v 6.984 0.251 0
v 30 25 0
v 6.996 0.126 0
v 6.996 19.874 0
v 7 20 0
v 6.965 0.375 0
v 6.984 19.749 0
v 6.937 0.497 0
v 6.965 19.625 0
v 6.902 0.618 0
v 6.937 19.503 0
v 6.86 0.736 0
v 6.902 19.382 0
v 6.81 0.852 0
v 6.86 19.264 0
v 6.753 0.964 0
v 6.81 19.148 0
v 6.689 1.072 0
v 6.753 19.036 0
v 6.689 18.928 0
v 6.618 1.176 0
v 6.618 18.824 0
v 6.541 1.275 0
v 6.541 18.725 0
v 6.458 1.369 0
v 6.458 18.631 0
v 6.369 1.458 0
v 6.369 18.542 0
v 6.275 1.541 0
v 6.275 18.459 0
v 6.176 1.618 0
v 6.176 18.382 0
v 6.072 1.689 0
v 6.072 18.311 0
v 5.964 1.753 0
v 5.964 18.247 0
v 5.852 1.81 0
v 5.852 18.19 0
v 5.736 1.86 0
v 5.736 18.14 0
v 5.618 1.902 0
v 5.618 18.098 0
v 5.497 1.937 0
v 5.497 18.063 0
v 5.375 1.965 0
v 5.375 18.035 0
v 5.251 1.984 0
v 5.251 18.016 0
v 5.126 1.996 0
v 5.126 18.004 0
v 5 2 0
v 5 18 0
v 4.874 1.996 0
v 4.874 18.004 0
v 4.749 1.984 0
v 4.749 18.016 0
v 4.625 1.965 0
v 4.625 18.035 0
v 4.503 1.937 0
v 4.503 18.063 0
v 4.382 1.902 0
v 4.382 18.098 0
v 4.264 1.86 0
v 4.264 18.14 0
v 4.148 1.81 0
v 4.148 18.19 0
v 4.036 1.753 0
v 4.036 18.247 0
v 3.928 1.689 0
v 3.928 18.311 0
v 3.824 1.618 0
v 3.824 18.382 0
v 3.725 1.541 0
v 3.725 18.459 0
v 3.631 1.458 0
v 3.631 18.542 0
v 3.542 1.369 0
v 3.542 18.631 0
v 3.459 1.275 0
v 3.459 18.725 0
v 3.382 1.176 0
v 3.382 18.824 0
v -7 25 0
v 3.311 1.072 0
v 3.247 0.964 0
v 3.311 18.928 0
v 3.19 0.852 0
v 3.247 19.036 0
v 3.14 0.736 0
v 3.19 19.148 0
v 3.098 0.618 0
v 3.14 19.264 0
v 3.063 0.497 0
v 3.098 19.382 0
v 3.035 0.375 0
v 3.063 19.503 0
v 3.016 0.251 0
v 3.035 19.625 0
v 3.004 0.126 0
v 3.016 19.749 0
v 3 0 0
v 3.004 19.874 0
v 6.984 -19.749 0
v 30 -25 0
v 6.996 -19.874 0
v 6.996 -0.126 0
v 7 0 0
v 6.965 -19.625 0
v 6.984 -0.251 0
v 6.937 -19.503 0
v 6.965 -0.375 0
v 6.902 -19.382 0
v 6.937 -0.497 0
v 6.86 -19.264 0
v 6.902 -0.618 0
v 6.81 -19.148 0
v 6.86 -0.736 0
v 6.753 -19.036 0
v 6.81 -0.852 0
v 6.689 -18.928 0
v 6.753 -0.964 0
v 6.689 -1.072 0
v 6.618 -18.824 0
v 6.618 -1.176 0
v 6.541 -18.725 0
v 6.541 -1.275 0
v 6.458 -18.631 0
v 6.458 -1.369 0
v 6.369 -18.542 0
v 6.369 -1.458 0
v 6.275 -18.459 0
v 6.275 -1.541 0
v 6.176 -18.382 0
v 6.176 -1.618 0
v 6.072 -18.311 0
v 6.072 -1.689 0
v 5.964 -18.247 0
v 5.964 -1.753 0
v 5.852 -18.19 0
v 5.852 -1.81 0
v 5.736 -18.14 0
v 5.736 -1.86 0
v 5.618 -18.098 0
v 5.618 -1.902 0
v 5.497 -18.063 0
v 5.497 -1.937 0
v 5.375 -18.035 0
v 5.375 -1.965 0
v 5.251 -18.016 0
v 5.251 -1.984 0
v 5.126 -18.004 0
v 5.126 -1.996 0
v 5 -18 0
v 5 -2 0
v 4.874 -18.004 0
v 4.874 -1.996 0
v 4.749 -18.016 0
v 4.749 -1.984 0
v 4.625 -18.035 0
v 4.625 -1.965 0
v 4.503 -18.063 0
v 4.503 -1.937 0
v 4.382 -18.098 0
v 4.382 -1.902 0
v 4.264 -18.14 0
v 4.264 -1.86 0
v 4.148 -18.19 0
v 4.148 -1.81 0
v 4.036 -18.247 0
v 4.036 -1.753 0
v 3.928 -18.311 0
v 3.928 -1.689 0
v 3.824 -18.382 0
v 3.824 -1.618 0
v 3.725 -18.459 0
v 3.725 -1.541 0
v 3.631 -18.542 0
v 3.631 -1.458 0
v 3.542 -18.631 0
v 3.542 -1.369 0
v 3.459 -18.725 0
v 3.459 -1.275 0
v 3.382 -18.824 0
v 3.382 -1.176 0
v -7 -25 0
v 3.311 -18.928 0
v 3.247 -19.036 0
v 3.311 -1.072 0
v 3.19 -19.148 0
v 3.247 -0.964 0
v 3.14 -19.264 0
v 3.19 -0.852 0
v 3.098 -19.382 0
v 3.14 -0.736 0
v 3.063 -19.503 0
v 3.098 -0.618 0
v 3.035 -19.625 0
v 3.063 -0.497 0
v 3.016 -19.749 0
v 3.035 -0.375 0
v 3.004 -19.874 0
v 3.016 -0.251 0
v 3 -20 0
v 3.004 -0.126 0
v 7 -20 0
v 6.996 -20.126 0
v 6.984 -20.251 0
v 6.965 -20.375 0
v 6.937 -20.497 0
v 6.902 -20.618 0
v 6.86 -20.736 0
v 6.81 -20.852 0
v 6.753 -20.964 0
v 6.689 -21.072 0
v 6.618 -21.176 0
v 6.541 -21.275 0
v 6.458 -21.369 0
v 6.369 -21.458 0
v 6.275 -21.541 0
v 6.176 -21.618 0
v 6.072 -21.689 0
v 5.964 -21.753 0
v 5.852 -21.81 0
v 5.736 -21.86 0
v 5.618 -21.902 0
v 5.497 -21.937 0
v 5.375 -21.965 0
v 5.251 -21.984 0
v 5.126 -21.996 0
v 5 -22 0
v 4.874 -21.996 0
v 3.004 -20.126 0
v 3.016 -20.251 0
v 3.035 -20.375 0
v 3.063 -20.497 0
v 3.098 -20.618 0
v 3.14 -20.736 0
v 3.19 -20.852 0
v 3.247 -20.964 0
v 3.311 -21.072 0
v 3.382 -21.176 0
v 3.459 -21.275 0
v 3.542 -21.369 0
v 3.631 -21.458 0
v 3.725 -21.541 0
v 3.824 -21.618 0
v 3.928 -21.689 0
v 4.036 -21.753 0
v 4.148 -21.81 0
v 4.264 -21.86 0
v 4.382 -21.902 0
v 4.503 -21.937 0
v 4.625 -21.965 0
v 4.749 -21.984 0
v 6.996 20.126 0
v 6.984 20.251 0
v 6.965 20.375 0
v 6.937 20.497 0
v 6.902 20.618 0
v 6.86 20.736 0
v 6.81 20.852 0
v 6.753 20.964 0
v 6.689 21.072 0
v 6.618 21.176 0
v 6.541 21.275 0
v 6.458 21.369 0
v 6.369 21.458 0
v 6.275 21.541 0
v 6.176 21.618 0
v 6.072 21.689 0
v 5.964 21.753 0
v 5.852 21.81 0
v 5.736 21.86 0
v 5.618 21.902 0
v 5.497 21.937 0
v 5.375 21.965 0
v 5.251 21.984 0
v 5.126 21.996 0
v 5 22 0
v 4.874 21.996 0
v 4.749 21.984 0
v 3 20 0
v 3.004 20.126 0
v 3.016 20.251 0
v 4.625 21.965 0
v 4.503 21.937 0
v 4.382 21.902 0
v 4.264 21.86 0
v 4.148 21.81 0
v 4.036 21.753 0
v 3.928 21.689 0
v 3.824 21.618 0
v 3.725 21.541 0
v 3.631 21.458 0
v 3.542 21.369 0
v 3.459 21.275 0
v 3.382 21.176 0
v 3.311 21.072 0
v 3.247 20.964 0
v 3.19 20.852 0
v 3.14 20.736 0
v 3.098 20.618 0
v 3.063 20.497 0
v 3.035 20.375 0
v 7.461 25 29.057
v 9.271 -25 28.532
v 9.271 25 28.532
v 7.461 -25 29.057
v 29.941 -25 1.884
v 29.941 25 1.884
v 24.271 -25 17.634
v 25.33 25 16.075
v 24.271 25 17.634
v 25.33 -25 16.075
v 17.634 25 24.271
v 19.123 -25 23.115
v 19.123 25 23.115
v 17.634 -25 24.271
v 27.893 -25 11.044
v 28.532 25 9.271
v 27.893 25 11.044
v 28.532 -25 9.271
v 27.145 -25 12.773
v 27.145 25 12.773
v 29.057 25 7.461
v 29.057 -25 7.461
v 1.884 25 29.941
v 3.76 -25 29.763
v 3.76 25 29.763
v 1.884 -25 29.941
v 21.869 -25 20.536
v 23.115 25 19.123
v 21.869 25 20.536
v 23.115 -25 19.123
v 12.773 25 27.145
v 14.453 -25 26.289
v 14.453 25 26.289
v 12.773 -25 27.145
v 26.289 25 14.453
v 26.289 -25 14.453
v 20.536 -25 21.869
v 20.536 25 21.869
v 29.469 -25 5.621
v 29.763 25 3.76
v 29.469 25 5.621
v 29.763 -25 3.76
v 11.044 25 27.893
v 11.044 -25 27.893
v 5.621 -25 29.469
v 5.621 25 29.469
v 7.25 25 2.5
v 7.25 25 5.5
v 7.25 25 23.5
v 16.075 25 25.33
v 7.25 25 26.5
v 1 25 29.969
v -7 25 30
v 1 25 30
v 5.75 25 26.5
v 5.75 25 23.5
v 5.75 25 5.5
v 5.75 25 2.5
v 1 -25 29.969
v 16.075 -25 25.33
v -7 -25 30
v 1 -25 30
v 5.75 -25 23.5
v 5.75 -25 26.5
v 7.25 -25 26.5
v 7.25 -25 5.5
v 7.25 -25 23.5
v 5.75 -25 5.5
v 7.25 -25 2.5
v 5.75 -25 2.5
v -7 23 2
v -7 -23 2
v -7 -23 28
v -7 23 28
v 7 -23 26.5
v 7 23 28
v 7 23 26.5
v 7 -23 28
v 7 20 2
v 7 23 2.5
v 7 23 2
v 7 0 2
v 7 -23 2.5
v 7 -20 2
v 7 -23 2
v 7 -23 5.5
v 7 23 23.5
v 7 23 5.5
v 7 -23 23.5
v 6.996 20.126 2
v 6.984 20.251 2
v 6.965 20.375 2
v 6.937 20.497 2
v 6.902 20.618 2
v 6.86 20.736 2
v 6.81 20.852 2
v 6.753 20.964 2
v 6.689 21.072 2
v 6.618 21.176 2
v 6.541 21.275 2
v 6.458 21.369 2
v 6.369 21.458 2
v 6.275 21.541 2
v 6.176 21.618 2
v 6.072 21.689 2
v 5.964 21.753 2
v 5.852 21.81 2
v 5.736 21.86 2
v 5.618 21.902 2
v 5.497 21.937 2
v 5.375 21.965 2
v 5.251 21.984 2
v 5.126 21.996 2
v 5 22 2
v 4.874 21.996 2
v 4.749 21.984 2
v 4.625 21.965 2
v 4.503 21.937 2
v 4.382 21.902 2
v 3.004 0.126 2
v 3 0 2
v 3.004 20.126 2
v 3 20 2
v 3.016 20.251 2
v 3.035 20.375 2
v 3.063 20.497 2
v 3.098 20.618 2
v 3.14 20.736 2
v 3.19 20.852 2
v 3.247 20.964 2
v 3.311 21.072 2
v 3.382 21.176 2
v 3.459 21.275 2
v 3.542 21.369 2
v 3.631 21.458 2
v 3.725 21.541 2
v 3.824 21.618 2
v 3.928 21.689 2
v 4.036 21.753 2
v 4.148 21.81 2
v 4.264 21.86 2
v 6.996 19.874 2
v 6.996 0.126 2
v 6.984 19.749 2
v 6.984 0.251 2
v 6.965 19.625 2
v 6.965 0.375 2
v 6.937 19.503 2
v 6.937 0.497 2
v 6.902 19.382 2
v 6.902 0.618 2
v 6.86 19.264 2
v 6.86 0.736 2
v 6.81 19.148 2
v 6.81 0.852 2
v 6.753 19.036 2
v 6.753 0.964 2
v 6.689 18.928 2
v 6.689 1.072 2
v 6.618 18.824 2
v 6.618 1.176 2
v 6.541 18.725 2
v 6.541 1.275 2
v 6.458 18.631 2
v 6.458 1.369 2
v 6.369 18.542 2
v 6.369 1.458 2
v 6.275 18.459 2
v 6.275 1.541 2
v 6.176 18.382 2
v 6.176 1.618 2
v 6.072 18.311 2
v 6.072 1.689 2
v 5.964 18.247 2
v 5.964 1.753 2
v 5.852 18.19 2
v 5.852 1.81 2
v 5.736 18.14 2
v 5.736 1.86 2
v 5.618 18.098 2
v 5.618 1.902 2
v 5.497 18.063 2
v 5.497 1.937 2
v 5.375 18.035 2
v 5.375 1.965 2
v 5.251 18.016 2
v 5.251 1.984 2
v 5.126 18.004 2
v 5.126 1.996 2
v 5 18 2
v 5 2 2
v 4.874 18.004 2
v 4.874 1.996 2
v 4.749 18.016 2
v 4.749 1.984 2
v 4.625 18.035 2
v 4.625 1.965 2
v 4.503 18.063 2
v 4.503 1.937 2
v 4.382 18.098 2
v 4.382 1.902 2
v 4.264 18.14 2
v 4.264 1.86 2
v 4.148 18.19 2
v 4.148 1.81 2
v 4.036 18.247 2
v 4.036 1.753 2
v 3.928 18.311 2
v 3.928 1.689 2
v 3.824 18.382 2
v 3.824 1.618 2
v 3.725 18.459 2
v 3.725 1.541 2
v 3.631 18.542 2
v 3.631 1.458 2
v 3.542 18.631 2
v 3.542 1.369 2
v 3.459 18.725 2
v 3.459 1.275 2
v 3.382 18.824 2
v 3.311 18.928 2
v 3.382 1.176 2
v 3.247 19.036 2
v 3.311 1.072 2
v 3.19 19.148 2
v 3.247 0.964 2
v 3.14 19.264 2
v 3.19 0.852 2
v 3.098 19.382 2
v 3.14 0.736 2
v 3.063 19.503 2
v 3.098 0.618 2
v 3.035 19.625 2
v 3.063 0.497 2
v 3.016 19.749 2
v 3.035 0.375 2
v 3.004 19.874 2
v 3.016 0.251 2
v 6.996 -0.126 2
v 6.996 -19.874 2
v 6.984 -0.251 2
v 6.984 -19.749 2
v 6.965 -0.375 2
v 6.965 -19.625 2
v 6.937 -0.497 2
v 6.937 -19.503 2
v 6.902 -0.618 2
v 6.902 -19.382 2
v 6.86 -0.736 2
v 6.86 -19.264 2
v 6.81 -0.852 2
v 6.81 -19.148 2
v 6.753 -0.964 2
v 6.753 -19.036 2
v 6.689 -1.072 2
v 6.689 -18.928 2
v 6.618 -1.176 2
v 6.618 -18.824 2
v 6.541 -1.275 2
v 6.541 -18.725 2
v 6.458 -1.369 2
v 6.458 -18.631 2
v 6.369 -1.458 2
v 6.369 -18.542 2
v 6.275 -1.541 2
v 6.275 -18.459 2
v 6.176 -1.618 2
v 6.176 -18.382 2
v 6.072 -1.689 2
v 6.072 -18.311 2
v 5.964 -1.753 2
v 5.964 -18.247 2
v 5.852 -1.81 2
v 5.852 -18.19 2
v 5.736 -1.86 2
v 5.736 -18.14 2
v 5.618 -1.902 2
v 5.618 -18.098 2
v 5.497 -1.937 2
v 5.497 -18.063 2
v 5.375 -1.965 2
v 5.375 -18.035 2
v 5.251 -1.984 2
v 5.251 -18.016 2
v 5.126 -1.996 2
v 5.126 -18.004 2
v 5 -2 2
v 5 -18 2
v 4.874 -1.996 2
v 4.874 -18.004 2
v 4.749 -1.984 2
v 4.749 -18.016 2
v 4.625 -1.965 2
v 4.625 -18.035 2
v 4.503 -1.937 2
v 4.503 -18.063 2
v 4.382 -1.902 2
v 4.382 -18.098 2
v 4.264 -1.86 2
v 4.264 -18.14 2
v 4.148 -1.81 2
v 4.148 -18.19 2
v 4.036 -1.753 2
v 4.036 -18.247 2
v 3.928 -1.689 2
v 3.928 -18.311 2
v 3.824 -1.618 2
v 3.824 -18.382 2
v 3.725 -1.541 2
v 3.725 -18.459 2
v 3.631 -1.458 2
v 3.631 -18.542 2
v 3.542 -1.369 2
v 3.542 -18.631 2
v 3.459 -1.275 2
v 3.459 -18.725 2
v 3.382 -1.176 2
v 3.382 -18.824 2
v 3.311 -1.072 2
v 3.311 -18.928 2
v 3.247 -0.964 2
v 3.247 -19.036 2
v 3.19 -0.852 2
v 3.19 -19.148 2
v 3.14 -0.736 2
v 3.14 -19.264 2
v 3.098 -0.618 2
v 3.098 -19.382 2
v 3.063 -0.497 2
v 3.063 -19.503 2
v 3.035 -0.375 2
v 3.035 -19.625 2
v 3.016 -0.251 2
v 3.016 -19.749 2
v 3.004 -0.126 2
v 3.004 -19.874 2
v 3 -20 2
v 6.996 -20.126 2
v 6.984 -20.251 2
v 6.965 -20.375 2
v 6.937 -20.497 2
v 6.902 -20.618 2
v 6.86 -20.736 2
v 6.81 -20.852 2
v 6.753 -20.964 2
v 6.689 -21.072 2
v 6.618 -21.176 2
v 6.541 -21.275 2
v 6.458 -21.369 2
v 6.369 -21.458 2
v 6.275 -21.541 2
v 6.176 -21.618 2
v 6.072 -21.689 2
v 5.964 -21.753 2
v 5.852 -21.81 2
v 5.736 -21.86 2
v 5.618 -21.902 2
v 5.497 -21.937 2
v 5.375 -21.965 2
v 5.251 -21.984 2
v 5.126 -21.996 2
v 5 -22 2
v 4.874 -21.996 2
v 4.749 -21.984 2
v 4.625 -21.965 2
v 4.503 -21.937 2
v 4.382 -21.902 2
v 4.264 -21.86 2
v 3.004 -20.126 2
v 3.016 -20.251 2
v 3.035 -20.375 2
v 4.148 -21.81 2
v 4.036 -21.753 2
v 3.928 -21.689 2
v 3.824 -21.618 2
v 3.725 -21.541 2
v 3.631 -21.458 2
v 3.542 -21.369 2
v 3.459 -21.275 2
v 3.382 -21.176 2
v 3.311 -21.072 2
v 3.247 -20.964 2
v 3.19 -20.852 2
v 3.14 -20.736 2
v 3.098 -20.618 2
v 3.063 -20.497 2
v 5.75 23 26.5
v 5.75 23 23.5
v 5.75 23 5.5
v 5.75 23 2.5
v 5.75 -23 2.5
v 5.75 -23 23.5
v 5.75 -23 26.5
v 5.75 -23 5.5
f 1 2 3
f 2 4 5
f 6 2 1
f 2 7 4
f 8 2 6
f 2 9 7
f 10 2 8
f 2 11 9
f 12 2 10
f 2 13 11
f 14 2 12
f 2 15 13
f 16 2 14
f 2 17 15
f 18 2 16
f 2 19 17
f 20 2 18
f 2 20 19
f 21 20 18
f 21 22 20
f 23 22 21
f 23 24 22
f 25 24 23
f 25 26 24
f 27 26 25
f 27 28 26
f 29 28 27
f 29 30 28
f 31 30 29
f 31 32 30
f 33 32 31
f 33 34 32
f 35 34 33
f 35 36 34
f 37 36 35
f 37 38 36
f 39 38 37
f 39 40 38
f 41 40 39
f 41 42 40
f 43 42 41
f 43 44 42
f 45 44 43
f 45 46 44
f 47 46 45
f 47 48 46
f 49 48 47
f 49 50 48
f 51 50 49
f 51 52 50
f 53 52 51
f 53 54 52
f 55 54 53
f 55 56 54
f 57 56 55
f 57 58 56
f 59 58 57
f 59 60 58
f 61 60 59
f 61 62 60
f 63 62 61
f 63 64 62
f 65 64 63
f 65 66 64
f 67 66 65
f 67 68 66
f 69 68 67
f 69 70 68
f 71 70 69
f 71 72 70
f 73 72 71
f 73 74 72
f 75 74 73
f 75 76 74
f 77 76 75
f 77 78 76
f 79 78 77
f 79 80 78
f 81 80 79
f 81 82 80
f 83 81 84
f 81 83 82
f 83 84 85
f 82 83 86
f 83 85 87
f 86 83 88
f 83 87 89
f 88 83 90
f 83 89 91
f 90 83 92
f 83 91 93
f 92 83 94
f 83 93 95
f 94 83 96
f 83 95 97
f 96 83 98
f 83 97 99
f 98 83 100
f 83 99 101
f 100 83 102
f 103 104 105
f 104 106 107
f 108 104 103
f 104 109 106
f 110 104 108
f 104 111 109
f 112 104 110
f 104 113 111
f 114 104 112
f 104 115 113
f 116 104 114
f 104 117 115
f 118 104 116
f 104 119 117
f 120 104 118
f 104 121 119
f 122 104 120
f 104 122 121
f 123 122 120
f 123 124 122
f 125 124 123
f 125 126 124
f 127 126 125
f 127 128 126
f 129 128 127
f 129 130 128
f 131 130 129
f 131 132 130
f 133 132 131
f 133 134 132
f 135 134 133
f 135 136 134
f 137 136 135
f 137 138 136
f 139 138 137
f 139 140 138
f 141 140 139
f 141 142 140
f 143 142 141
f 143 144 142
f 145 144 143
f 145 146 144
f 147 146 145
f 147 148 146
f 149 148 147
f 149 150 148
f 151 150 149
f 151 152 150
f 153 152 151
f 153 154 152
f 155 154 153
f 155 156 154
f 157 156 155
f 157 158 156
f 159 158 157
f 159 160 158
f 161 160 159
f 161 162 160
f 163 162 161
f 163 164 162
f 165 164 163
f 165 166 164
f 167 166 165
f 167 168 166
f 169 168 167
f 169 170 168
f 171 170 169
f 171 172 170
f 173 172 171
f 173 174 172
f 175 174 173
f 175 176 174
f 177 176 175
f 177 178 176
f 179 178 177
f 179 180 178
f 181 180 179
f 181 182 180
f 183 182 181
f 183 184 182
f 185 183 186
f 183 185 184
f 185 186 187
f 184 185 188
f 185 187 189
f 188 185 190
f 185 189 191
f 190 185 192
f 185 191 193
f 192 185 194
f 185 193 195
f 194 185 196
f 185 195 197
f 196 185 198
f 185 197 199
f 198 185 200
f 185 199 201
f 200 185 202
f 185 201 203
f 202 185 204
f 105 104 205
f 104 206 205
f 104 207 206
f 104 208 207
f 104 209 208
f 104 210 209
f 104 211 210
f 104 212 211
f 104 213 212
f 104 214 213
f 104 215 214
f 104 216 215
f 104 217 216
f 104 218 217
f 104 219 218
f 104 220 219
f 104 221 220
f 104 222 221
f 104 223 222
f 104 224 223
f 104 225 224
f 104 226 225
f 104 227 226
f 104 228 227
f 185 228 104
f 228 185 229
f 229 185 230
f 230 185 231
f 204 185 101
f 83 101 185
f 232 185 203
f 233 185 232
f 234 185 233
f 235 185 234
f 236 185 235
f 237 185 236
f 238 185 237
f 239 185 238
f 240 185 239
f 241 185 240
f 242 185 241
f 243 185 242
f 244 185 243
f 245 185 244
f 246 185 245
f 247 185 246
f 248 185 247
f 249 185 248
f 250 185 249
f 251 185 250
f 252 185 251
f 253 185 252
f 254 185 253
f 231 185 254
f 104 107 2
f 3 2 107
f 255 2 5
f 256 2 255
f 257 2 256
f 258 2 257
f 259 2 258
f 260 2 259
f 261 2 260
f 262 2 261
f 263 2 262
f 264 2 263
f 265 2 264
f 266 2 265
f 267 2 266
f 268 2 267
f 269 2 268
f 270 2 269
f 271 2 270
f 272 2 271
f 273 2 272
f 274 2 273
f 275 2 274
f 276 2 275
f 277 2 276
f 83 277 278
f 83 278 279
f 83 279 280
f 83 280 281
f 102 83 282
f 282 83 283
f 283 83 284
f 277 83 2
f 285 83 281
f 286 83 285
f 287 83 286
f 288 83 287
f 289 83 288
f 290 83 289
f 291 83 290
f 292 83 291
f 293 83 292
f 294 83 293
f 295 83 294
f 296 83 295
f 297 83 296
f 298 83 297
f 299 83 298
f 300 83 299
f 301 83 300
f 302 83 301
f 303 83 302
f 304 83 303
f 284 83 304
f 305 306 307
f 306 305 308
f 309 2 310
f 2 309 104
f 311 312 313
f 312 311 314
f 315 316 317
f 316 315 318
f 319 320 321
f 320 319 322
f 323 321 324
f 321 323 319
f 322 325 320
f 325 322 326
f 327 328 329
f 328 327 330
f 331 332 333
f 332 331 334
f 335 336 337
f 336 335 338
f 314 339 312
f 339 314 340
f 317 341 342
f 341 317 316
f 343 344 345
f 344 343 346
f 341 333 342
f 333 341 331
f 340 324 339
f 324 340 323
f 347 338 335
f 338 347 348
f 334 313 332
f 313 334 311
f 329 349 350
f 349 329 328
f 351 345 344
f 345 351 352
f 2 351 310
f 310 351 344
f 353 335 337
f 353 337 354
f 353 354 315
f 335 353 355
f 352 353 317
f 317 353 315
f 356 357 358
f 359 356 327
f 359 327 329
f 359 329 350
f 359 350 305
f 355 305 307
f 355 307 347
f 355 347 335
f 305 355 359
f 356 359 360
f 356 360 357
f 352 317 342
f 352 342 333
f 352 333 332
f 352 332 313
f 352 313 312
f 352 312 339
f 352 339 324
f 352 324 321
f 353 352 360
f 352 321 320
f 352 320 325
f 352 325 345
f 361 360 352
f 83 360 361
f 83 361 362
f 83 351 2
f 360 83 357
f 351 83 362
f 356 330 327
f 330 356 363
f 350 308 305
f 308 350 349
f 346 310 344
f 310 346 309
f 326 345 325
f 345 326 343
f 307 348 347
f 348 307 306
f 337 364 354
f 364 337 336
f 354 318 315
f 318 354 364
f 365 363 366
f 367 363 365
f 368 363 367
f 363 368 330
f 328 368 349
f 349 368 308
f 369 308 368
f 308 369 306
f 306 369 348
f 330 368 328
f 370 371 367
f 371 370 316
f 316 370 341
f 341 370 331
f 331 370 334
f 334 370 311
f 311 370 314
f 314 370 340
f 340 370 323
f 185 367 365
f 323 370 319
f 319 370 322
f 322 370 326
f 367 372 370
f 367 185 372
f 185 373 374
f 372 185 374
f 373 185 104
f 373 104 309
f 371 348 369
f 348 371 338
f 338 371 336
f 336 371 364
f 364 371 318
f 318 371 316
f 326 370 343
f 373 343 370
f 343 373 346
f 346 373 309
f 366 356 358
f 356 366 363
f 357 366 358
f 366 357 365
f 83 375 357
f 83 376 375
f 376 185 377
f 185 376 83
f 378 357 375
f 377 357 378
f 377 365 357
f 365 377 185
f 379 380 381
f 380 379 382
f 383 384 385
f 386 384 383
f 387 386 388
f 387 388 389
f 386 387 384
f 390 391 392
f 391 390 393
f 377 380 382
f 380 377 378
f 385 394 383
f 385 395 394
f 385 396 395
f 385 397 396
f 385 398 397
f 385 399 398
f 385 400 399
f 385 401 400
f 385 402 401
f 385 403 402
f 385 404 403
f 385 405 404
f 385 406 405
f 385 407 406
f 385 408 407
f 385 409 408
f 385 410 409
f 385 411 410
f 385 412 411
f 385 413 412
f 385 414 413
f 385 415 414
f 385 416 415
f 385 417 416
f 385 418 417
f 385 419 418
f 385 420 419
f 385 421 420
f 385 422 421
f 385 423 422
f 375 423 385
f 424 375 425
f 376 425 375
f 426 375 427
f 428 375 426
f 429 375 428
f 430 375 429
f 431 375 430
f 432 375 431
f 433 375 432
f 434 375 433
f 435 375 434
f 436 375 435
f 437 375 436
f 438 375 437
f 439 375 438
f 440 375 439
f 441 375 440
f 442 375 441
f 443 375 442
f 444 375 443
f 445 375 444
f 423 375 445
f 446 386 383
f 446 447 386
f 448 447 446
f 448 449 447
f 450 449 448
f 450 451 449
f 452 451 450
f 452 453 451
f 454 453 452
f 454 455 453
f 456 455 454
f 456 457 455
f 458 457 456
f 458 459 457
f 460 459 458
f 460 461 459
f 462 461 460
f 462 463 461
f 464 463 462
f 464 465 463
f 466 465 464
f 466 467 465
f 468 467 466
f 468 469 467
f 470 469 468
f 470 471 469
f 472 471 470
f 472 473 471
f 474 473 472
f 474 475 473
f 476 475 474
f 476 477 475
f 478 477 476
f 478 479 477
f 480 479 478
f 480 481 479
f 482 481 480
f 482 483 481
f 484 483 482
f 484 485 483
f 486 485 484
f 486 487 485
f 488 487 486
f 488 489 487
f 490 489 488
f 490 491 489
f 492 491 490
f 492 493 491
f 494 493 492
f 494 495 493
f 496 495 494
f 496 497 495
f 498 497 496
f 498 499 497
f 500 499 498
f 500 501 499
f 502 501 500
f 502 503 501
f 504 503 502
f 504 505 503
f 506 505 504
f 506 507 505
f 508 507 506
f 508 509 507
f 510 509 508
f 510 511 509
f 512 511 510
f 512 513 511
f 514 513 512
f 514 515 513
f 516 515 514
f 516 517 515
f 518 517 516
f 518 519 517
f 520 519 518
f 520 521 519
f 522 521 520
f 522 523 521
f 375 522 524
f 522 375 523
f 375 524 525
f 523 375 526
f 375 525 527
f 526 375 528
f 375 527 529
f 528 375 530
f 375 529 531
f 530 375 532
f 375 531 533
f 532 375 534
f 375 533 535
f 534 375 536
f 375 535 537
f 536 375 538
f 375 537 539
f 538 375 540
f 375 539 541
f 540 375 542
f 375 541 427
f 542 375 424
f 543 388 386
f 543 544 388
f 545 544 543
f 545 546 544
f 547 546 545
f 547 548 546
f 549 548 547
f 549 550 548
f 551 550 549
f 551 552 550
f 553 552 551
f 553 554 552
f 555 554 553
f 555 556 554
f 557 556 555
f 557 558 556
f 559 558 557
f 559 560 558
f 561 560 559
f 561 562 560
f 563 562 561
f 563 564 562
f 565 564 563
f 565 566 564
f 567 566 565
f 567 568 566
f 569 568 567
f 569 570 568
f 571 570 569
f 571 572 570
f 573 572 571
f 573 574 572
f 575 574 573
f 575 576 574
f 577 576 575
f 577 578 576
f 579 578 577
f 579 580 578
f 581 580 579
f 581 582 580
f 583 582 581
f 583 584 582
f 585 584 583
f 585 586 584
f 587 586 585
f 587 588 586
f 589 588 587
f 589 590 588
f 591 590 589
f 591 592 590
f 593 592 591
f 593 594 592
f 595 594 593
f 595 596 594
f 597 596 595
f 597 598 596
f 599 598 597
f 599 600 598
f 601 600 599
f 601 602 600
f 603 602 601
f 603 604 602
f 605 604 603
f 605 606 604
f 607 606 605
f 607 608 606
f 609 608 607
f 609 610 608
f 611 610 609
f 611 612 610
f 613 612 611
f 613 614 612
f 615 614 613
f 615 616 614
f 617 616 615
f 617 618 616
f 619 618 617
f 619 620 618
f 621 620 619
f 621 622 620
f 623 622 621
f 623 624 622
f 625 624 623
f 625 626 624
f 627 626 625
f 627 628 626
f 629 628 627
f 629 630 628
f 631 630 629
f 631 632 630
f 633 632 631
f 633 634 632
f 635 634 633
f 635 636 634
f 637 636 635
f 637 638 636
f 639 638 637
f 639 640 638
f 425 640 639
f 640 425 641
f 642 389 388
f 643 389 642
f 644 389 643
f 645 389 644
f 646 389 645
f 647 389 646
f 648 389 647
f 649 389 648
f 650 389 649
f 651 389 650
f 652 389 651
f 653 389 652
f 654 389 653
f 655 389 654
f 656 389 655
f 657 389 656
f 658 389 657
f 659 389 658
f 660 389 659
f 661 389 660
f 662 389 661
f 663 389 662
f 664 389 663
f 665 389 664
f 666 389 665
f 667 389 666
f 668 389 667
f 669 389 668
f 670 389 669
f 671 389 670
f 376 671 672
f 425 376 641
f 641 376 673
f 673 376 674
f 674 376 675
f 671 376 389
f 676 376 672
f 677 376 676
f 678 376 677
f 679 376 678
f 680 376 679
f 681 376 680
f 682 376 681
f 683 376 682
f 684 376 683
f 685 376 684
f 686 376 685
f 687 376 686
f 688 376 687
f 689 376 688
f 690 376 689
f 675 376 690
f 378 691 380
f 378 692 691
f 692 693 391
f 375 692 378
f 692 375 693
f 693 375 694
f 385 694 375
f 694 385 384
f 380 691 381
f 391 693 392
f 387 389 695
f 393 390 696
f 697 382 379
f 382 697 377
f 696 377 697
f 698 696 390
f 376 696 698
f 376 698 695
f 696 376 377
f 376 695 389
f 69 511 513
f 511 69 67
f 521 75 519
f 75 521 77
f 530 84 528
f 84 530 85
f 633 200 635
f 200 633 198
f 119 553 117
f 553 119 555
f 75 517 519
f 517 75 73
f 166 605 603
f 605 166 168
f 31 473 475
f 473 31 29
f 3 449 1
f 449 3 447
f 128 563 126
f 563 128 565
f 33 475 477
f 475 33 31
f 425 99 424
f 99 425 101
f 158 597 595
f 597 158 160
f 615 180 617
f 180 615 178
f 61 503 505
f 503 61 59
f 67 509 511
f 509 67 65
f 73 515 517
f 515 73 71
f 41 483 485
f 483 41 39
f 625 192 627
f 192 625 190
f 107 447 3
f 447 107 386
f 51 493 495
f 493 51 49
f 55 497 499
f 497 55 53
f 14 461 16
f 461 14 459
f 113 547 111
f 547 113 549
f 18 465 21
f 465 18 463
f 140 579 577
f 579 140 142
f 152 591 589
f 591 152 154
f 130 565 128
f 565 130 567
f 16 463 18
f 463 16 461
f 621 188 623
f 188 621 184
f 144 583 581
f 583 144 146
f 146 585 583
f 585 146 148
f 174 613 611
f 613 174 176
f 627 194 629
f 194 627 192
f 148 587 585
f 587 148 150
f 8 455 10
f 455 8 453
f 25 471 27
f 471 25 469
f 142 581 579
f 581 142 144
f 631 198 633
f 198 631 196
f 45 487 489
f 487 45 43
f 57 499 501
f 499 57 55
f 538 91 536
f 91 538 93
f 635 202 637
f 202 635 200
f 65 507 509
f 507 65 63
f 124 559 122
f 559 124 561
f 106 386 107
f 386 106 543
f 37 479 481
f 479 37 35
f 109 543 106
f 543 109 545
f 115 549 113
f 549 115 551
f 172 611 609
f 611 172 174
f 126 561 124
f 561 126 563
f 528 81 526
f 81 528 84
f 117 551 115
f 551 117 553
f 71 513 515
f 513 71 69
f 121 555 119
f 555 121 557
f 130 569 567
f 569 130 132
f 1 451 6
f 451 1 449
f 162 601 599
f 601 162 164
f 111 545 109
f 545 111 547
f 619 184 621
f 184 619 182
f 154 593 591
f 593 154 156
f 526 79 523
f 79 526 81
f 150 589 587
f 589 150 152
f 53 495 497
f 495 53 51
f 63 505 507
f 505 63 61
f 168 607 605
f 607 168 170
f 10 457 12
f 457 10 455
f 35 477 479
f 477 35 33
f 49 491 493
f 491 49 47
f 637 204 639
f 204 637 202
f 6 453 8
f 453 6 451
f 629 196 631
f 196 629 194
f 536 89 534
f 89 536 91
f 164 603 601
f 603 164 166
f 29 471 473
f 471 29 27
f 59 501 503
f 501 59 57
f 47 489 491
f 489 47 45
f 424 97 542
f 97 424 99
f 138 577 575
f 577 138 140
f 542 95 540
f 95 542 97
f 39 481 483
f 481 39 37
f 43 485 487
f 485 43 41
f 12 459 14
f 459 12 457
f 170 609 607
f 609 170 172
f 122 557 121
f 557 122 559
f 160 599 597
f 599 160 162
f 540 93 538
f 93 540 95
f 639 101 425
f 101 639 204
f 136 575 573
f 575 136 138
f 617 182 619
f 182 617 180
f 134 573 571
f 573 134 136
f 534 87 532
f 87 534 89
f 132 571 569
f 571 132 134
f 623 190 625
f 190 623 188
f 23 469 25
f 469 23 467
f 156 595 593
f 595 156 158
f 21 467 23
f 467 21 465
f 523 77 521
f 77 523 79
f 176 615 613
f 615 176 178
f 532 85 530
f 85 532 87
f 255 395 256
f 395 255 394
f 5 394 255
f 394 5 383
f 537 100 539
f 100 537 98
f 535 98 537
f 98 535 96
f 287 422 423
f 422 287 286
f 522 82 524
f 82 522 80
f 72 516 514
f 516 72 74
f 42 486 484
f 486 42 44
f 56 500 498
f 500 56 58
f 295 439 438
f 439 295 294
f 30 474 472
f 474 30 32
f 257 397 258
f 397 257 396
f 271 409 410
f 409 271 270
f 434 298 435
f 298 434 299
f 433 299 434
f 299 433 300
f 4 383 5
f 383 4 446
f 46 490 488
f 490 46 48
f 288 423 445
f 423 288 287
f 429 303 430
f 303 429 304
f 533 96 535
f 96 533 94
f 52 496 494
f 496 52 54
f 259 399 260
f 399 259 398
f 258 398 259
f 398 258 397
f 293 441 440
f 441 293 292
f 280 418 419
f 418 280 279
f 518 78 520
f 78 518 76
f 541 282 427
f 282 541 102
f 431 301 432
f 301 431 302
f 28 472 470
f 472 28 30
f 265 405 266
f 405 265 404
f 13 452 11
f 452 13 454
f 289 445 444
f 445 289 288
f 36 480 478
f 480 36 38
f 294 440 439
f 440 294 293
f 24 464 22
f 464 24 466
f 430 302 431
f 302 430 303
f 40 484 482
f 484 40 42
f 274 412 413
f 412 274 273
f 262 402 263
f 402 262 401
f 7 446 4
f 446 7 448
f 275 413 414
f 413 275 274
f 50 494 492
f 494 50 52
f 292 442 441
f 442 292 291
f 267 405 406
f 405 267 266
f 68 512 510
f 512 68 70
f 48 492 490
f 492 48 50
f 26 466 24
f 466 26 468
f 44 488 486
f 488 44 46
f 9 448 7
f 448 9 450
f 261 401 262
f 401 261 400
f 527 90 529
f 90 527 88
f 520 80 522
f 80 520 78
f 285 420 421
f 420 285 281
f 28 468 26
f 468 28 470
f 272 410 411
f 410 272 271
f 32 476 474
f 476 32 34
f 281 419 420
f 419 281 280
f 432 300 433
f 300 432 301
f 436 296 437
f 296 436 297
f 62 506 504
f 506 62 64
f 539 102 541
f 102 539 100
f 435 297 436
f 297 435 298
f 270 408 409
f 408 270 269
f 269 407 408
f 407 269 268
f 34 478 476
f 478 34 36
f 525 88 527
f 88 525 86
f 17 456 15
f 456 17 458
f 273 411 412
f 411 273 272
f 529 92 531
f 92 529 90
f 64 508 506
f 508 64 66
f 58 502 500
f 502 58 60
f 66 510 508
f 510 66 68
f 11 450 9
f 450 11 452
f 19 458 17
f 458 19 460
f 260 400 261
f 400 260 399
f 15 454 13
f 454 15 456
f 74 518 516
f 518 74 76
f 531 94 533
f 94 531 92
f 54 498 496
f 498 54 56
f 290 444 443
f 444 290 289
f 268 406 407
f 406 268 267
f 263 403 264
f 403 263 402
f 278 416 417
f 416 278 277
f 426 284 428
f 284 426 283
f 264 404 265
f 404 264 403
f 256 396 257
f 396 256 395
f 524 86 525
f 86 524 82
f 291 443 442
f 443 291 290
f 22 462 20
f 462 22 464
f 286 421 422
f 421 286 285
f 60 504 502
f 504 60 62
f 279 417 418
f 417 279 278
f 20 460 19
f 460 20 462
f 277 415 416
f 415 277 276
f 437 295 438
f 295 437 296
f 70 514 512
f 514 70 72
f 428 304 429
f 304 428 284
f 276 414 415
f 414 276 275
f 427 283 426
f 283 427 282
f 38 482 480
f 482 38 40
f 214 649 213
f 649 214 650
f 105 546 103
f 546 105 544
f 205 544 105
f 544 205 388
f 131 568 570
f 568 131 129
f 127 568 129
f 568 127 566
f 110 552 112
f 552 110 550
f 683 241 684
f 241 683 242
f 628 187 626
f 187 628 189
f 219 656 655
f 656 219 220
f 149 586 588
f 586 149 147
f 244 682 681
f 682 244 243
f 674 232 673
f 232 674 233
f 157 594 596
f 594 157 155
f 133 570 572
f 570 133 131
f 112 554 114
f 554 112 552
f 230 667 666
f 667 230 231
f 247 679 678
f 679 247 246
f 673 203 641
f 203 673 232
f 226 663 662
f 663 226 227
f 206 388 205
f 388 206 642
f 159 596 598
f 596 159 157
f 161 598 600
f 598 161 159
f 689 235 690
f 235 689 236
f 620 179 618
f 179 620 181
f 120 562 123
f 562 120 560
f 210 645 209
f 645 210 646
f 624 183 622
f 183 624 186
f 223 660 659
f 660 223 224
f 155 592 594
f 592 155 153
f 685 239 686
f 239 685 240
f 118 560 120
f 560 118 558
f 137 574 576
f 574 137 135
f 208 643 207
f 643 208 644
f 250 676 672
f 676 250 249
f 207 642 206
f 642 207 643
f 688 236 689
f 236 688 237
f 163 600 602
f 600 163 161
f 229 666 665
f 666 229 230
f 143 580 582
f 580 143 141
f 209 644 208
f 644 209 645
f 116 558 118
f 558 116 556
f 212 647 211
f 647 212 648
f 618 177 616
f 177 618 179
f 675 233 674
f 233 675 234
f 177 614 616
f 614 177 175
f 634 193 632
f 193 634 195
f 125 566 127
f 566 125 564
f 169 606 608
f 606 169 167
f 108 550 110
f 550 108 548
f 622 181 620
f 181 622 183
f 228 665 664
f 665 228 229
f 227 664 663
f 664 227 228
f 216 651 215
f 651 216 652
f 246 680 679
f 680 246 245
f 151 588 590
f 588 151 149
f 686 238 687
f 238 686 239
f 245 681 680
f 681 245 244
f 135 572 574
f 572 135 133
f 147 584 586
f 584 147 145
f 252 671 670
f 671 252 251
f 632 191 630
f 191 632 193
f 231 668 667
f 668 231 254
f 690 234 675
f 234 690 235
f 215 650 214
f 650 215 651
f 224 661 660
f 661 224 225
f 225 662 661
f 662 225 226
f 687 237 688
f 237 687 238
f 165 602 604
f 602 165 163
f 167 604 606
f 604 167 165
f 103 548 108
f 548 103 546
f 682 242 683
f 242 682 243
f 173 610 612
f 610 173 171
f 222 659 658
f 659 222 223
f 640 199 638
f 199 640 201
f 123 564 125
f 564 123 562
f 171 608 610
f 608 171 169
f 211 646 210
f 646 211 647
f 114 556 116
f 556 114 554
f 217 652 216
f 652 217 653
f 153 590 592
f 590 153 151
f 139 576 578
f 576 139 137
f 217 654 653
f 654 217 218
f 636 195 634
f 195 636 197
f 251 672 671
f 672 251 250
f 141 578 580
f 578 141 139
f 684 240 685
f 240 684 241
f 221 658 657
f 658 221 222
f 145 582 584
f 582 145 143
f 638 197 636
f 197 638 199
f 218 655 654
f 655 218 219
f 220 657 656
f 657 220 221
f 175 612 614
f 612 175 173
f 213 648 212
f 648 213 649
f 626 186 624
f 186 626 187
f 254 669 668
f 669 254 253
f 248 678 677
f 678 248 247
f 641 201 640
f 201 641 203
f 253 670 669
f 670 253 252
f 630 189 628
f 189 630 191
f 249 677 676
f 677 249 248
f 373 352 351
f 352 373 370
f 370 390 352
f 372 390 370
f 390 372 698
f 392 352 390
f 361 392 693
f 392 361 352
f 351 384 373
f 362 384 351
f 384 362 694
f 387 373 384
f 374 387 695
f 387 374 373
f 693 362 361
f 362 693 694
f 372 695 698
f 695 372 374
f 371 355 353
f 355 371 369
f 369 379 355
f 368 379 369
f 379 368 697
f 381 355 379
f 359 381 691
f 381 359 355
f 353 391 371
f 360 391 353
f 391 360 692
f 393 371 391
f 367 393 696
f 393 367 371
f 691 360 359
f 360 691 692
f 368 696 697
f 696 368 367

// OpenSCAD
module thmount () {
  difference(){
    union() {
      // main mount
      rotate([90,0,0])
	rotate_extrude(angle=90, $fn=100) {
	translate([15,0,0]) square([30,50],center=true);
      }
      //front extension
      translate([-3,0,(30/2)]) cube([8,50,30],center=true);
      //botom mouning flange
      //translate([11.5,0,1]) cube([37,60,2], center=true);
    }
    // cut out for display
    translate([-0.1,0,(30/2)]) cube([14.2,46,26], center=true);
    // mounting and breather holes
    translate([2,-25-2.5,-0.1]) cylinder(r=2,h=2.2, $fn=100);
    translate([2,25+2.5,-0.1]) cylinder(r=2,h=2.2, $fn=100);
    translate([5,0,-0.1]) cylinder(r=2,h=2.2, $fn=100);
    translate([5,20,-0.1]) cylinder(r=2,h=2.2, $fn=100);
    translate([5,-20,-0.1]) cylinder(r=2,h=2.2, $fn=100);
    translate([22,-25-2.5,-0.1]) cylinder(r=2,h=2.2, $fn=100);
    translate([22,25+2.5,-0.1]) cylinder(r=2,h=2.2, $fn=100);
    // vent holes for ambien temperature
    translate([6.5,0,4]) cube([1.5,55,3], center=true);
    translate([6.5,0,25]) cube([1.5,55,3], center=true);
  }
}
thmount();
